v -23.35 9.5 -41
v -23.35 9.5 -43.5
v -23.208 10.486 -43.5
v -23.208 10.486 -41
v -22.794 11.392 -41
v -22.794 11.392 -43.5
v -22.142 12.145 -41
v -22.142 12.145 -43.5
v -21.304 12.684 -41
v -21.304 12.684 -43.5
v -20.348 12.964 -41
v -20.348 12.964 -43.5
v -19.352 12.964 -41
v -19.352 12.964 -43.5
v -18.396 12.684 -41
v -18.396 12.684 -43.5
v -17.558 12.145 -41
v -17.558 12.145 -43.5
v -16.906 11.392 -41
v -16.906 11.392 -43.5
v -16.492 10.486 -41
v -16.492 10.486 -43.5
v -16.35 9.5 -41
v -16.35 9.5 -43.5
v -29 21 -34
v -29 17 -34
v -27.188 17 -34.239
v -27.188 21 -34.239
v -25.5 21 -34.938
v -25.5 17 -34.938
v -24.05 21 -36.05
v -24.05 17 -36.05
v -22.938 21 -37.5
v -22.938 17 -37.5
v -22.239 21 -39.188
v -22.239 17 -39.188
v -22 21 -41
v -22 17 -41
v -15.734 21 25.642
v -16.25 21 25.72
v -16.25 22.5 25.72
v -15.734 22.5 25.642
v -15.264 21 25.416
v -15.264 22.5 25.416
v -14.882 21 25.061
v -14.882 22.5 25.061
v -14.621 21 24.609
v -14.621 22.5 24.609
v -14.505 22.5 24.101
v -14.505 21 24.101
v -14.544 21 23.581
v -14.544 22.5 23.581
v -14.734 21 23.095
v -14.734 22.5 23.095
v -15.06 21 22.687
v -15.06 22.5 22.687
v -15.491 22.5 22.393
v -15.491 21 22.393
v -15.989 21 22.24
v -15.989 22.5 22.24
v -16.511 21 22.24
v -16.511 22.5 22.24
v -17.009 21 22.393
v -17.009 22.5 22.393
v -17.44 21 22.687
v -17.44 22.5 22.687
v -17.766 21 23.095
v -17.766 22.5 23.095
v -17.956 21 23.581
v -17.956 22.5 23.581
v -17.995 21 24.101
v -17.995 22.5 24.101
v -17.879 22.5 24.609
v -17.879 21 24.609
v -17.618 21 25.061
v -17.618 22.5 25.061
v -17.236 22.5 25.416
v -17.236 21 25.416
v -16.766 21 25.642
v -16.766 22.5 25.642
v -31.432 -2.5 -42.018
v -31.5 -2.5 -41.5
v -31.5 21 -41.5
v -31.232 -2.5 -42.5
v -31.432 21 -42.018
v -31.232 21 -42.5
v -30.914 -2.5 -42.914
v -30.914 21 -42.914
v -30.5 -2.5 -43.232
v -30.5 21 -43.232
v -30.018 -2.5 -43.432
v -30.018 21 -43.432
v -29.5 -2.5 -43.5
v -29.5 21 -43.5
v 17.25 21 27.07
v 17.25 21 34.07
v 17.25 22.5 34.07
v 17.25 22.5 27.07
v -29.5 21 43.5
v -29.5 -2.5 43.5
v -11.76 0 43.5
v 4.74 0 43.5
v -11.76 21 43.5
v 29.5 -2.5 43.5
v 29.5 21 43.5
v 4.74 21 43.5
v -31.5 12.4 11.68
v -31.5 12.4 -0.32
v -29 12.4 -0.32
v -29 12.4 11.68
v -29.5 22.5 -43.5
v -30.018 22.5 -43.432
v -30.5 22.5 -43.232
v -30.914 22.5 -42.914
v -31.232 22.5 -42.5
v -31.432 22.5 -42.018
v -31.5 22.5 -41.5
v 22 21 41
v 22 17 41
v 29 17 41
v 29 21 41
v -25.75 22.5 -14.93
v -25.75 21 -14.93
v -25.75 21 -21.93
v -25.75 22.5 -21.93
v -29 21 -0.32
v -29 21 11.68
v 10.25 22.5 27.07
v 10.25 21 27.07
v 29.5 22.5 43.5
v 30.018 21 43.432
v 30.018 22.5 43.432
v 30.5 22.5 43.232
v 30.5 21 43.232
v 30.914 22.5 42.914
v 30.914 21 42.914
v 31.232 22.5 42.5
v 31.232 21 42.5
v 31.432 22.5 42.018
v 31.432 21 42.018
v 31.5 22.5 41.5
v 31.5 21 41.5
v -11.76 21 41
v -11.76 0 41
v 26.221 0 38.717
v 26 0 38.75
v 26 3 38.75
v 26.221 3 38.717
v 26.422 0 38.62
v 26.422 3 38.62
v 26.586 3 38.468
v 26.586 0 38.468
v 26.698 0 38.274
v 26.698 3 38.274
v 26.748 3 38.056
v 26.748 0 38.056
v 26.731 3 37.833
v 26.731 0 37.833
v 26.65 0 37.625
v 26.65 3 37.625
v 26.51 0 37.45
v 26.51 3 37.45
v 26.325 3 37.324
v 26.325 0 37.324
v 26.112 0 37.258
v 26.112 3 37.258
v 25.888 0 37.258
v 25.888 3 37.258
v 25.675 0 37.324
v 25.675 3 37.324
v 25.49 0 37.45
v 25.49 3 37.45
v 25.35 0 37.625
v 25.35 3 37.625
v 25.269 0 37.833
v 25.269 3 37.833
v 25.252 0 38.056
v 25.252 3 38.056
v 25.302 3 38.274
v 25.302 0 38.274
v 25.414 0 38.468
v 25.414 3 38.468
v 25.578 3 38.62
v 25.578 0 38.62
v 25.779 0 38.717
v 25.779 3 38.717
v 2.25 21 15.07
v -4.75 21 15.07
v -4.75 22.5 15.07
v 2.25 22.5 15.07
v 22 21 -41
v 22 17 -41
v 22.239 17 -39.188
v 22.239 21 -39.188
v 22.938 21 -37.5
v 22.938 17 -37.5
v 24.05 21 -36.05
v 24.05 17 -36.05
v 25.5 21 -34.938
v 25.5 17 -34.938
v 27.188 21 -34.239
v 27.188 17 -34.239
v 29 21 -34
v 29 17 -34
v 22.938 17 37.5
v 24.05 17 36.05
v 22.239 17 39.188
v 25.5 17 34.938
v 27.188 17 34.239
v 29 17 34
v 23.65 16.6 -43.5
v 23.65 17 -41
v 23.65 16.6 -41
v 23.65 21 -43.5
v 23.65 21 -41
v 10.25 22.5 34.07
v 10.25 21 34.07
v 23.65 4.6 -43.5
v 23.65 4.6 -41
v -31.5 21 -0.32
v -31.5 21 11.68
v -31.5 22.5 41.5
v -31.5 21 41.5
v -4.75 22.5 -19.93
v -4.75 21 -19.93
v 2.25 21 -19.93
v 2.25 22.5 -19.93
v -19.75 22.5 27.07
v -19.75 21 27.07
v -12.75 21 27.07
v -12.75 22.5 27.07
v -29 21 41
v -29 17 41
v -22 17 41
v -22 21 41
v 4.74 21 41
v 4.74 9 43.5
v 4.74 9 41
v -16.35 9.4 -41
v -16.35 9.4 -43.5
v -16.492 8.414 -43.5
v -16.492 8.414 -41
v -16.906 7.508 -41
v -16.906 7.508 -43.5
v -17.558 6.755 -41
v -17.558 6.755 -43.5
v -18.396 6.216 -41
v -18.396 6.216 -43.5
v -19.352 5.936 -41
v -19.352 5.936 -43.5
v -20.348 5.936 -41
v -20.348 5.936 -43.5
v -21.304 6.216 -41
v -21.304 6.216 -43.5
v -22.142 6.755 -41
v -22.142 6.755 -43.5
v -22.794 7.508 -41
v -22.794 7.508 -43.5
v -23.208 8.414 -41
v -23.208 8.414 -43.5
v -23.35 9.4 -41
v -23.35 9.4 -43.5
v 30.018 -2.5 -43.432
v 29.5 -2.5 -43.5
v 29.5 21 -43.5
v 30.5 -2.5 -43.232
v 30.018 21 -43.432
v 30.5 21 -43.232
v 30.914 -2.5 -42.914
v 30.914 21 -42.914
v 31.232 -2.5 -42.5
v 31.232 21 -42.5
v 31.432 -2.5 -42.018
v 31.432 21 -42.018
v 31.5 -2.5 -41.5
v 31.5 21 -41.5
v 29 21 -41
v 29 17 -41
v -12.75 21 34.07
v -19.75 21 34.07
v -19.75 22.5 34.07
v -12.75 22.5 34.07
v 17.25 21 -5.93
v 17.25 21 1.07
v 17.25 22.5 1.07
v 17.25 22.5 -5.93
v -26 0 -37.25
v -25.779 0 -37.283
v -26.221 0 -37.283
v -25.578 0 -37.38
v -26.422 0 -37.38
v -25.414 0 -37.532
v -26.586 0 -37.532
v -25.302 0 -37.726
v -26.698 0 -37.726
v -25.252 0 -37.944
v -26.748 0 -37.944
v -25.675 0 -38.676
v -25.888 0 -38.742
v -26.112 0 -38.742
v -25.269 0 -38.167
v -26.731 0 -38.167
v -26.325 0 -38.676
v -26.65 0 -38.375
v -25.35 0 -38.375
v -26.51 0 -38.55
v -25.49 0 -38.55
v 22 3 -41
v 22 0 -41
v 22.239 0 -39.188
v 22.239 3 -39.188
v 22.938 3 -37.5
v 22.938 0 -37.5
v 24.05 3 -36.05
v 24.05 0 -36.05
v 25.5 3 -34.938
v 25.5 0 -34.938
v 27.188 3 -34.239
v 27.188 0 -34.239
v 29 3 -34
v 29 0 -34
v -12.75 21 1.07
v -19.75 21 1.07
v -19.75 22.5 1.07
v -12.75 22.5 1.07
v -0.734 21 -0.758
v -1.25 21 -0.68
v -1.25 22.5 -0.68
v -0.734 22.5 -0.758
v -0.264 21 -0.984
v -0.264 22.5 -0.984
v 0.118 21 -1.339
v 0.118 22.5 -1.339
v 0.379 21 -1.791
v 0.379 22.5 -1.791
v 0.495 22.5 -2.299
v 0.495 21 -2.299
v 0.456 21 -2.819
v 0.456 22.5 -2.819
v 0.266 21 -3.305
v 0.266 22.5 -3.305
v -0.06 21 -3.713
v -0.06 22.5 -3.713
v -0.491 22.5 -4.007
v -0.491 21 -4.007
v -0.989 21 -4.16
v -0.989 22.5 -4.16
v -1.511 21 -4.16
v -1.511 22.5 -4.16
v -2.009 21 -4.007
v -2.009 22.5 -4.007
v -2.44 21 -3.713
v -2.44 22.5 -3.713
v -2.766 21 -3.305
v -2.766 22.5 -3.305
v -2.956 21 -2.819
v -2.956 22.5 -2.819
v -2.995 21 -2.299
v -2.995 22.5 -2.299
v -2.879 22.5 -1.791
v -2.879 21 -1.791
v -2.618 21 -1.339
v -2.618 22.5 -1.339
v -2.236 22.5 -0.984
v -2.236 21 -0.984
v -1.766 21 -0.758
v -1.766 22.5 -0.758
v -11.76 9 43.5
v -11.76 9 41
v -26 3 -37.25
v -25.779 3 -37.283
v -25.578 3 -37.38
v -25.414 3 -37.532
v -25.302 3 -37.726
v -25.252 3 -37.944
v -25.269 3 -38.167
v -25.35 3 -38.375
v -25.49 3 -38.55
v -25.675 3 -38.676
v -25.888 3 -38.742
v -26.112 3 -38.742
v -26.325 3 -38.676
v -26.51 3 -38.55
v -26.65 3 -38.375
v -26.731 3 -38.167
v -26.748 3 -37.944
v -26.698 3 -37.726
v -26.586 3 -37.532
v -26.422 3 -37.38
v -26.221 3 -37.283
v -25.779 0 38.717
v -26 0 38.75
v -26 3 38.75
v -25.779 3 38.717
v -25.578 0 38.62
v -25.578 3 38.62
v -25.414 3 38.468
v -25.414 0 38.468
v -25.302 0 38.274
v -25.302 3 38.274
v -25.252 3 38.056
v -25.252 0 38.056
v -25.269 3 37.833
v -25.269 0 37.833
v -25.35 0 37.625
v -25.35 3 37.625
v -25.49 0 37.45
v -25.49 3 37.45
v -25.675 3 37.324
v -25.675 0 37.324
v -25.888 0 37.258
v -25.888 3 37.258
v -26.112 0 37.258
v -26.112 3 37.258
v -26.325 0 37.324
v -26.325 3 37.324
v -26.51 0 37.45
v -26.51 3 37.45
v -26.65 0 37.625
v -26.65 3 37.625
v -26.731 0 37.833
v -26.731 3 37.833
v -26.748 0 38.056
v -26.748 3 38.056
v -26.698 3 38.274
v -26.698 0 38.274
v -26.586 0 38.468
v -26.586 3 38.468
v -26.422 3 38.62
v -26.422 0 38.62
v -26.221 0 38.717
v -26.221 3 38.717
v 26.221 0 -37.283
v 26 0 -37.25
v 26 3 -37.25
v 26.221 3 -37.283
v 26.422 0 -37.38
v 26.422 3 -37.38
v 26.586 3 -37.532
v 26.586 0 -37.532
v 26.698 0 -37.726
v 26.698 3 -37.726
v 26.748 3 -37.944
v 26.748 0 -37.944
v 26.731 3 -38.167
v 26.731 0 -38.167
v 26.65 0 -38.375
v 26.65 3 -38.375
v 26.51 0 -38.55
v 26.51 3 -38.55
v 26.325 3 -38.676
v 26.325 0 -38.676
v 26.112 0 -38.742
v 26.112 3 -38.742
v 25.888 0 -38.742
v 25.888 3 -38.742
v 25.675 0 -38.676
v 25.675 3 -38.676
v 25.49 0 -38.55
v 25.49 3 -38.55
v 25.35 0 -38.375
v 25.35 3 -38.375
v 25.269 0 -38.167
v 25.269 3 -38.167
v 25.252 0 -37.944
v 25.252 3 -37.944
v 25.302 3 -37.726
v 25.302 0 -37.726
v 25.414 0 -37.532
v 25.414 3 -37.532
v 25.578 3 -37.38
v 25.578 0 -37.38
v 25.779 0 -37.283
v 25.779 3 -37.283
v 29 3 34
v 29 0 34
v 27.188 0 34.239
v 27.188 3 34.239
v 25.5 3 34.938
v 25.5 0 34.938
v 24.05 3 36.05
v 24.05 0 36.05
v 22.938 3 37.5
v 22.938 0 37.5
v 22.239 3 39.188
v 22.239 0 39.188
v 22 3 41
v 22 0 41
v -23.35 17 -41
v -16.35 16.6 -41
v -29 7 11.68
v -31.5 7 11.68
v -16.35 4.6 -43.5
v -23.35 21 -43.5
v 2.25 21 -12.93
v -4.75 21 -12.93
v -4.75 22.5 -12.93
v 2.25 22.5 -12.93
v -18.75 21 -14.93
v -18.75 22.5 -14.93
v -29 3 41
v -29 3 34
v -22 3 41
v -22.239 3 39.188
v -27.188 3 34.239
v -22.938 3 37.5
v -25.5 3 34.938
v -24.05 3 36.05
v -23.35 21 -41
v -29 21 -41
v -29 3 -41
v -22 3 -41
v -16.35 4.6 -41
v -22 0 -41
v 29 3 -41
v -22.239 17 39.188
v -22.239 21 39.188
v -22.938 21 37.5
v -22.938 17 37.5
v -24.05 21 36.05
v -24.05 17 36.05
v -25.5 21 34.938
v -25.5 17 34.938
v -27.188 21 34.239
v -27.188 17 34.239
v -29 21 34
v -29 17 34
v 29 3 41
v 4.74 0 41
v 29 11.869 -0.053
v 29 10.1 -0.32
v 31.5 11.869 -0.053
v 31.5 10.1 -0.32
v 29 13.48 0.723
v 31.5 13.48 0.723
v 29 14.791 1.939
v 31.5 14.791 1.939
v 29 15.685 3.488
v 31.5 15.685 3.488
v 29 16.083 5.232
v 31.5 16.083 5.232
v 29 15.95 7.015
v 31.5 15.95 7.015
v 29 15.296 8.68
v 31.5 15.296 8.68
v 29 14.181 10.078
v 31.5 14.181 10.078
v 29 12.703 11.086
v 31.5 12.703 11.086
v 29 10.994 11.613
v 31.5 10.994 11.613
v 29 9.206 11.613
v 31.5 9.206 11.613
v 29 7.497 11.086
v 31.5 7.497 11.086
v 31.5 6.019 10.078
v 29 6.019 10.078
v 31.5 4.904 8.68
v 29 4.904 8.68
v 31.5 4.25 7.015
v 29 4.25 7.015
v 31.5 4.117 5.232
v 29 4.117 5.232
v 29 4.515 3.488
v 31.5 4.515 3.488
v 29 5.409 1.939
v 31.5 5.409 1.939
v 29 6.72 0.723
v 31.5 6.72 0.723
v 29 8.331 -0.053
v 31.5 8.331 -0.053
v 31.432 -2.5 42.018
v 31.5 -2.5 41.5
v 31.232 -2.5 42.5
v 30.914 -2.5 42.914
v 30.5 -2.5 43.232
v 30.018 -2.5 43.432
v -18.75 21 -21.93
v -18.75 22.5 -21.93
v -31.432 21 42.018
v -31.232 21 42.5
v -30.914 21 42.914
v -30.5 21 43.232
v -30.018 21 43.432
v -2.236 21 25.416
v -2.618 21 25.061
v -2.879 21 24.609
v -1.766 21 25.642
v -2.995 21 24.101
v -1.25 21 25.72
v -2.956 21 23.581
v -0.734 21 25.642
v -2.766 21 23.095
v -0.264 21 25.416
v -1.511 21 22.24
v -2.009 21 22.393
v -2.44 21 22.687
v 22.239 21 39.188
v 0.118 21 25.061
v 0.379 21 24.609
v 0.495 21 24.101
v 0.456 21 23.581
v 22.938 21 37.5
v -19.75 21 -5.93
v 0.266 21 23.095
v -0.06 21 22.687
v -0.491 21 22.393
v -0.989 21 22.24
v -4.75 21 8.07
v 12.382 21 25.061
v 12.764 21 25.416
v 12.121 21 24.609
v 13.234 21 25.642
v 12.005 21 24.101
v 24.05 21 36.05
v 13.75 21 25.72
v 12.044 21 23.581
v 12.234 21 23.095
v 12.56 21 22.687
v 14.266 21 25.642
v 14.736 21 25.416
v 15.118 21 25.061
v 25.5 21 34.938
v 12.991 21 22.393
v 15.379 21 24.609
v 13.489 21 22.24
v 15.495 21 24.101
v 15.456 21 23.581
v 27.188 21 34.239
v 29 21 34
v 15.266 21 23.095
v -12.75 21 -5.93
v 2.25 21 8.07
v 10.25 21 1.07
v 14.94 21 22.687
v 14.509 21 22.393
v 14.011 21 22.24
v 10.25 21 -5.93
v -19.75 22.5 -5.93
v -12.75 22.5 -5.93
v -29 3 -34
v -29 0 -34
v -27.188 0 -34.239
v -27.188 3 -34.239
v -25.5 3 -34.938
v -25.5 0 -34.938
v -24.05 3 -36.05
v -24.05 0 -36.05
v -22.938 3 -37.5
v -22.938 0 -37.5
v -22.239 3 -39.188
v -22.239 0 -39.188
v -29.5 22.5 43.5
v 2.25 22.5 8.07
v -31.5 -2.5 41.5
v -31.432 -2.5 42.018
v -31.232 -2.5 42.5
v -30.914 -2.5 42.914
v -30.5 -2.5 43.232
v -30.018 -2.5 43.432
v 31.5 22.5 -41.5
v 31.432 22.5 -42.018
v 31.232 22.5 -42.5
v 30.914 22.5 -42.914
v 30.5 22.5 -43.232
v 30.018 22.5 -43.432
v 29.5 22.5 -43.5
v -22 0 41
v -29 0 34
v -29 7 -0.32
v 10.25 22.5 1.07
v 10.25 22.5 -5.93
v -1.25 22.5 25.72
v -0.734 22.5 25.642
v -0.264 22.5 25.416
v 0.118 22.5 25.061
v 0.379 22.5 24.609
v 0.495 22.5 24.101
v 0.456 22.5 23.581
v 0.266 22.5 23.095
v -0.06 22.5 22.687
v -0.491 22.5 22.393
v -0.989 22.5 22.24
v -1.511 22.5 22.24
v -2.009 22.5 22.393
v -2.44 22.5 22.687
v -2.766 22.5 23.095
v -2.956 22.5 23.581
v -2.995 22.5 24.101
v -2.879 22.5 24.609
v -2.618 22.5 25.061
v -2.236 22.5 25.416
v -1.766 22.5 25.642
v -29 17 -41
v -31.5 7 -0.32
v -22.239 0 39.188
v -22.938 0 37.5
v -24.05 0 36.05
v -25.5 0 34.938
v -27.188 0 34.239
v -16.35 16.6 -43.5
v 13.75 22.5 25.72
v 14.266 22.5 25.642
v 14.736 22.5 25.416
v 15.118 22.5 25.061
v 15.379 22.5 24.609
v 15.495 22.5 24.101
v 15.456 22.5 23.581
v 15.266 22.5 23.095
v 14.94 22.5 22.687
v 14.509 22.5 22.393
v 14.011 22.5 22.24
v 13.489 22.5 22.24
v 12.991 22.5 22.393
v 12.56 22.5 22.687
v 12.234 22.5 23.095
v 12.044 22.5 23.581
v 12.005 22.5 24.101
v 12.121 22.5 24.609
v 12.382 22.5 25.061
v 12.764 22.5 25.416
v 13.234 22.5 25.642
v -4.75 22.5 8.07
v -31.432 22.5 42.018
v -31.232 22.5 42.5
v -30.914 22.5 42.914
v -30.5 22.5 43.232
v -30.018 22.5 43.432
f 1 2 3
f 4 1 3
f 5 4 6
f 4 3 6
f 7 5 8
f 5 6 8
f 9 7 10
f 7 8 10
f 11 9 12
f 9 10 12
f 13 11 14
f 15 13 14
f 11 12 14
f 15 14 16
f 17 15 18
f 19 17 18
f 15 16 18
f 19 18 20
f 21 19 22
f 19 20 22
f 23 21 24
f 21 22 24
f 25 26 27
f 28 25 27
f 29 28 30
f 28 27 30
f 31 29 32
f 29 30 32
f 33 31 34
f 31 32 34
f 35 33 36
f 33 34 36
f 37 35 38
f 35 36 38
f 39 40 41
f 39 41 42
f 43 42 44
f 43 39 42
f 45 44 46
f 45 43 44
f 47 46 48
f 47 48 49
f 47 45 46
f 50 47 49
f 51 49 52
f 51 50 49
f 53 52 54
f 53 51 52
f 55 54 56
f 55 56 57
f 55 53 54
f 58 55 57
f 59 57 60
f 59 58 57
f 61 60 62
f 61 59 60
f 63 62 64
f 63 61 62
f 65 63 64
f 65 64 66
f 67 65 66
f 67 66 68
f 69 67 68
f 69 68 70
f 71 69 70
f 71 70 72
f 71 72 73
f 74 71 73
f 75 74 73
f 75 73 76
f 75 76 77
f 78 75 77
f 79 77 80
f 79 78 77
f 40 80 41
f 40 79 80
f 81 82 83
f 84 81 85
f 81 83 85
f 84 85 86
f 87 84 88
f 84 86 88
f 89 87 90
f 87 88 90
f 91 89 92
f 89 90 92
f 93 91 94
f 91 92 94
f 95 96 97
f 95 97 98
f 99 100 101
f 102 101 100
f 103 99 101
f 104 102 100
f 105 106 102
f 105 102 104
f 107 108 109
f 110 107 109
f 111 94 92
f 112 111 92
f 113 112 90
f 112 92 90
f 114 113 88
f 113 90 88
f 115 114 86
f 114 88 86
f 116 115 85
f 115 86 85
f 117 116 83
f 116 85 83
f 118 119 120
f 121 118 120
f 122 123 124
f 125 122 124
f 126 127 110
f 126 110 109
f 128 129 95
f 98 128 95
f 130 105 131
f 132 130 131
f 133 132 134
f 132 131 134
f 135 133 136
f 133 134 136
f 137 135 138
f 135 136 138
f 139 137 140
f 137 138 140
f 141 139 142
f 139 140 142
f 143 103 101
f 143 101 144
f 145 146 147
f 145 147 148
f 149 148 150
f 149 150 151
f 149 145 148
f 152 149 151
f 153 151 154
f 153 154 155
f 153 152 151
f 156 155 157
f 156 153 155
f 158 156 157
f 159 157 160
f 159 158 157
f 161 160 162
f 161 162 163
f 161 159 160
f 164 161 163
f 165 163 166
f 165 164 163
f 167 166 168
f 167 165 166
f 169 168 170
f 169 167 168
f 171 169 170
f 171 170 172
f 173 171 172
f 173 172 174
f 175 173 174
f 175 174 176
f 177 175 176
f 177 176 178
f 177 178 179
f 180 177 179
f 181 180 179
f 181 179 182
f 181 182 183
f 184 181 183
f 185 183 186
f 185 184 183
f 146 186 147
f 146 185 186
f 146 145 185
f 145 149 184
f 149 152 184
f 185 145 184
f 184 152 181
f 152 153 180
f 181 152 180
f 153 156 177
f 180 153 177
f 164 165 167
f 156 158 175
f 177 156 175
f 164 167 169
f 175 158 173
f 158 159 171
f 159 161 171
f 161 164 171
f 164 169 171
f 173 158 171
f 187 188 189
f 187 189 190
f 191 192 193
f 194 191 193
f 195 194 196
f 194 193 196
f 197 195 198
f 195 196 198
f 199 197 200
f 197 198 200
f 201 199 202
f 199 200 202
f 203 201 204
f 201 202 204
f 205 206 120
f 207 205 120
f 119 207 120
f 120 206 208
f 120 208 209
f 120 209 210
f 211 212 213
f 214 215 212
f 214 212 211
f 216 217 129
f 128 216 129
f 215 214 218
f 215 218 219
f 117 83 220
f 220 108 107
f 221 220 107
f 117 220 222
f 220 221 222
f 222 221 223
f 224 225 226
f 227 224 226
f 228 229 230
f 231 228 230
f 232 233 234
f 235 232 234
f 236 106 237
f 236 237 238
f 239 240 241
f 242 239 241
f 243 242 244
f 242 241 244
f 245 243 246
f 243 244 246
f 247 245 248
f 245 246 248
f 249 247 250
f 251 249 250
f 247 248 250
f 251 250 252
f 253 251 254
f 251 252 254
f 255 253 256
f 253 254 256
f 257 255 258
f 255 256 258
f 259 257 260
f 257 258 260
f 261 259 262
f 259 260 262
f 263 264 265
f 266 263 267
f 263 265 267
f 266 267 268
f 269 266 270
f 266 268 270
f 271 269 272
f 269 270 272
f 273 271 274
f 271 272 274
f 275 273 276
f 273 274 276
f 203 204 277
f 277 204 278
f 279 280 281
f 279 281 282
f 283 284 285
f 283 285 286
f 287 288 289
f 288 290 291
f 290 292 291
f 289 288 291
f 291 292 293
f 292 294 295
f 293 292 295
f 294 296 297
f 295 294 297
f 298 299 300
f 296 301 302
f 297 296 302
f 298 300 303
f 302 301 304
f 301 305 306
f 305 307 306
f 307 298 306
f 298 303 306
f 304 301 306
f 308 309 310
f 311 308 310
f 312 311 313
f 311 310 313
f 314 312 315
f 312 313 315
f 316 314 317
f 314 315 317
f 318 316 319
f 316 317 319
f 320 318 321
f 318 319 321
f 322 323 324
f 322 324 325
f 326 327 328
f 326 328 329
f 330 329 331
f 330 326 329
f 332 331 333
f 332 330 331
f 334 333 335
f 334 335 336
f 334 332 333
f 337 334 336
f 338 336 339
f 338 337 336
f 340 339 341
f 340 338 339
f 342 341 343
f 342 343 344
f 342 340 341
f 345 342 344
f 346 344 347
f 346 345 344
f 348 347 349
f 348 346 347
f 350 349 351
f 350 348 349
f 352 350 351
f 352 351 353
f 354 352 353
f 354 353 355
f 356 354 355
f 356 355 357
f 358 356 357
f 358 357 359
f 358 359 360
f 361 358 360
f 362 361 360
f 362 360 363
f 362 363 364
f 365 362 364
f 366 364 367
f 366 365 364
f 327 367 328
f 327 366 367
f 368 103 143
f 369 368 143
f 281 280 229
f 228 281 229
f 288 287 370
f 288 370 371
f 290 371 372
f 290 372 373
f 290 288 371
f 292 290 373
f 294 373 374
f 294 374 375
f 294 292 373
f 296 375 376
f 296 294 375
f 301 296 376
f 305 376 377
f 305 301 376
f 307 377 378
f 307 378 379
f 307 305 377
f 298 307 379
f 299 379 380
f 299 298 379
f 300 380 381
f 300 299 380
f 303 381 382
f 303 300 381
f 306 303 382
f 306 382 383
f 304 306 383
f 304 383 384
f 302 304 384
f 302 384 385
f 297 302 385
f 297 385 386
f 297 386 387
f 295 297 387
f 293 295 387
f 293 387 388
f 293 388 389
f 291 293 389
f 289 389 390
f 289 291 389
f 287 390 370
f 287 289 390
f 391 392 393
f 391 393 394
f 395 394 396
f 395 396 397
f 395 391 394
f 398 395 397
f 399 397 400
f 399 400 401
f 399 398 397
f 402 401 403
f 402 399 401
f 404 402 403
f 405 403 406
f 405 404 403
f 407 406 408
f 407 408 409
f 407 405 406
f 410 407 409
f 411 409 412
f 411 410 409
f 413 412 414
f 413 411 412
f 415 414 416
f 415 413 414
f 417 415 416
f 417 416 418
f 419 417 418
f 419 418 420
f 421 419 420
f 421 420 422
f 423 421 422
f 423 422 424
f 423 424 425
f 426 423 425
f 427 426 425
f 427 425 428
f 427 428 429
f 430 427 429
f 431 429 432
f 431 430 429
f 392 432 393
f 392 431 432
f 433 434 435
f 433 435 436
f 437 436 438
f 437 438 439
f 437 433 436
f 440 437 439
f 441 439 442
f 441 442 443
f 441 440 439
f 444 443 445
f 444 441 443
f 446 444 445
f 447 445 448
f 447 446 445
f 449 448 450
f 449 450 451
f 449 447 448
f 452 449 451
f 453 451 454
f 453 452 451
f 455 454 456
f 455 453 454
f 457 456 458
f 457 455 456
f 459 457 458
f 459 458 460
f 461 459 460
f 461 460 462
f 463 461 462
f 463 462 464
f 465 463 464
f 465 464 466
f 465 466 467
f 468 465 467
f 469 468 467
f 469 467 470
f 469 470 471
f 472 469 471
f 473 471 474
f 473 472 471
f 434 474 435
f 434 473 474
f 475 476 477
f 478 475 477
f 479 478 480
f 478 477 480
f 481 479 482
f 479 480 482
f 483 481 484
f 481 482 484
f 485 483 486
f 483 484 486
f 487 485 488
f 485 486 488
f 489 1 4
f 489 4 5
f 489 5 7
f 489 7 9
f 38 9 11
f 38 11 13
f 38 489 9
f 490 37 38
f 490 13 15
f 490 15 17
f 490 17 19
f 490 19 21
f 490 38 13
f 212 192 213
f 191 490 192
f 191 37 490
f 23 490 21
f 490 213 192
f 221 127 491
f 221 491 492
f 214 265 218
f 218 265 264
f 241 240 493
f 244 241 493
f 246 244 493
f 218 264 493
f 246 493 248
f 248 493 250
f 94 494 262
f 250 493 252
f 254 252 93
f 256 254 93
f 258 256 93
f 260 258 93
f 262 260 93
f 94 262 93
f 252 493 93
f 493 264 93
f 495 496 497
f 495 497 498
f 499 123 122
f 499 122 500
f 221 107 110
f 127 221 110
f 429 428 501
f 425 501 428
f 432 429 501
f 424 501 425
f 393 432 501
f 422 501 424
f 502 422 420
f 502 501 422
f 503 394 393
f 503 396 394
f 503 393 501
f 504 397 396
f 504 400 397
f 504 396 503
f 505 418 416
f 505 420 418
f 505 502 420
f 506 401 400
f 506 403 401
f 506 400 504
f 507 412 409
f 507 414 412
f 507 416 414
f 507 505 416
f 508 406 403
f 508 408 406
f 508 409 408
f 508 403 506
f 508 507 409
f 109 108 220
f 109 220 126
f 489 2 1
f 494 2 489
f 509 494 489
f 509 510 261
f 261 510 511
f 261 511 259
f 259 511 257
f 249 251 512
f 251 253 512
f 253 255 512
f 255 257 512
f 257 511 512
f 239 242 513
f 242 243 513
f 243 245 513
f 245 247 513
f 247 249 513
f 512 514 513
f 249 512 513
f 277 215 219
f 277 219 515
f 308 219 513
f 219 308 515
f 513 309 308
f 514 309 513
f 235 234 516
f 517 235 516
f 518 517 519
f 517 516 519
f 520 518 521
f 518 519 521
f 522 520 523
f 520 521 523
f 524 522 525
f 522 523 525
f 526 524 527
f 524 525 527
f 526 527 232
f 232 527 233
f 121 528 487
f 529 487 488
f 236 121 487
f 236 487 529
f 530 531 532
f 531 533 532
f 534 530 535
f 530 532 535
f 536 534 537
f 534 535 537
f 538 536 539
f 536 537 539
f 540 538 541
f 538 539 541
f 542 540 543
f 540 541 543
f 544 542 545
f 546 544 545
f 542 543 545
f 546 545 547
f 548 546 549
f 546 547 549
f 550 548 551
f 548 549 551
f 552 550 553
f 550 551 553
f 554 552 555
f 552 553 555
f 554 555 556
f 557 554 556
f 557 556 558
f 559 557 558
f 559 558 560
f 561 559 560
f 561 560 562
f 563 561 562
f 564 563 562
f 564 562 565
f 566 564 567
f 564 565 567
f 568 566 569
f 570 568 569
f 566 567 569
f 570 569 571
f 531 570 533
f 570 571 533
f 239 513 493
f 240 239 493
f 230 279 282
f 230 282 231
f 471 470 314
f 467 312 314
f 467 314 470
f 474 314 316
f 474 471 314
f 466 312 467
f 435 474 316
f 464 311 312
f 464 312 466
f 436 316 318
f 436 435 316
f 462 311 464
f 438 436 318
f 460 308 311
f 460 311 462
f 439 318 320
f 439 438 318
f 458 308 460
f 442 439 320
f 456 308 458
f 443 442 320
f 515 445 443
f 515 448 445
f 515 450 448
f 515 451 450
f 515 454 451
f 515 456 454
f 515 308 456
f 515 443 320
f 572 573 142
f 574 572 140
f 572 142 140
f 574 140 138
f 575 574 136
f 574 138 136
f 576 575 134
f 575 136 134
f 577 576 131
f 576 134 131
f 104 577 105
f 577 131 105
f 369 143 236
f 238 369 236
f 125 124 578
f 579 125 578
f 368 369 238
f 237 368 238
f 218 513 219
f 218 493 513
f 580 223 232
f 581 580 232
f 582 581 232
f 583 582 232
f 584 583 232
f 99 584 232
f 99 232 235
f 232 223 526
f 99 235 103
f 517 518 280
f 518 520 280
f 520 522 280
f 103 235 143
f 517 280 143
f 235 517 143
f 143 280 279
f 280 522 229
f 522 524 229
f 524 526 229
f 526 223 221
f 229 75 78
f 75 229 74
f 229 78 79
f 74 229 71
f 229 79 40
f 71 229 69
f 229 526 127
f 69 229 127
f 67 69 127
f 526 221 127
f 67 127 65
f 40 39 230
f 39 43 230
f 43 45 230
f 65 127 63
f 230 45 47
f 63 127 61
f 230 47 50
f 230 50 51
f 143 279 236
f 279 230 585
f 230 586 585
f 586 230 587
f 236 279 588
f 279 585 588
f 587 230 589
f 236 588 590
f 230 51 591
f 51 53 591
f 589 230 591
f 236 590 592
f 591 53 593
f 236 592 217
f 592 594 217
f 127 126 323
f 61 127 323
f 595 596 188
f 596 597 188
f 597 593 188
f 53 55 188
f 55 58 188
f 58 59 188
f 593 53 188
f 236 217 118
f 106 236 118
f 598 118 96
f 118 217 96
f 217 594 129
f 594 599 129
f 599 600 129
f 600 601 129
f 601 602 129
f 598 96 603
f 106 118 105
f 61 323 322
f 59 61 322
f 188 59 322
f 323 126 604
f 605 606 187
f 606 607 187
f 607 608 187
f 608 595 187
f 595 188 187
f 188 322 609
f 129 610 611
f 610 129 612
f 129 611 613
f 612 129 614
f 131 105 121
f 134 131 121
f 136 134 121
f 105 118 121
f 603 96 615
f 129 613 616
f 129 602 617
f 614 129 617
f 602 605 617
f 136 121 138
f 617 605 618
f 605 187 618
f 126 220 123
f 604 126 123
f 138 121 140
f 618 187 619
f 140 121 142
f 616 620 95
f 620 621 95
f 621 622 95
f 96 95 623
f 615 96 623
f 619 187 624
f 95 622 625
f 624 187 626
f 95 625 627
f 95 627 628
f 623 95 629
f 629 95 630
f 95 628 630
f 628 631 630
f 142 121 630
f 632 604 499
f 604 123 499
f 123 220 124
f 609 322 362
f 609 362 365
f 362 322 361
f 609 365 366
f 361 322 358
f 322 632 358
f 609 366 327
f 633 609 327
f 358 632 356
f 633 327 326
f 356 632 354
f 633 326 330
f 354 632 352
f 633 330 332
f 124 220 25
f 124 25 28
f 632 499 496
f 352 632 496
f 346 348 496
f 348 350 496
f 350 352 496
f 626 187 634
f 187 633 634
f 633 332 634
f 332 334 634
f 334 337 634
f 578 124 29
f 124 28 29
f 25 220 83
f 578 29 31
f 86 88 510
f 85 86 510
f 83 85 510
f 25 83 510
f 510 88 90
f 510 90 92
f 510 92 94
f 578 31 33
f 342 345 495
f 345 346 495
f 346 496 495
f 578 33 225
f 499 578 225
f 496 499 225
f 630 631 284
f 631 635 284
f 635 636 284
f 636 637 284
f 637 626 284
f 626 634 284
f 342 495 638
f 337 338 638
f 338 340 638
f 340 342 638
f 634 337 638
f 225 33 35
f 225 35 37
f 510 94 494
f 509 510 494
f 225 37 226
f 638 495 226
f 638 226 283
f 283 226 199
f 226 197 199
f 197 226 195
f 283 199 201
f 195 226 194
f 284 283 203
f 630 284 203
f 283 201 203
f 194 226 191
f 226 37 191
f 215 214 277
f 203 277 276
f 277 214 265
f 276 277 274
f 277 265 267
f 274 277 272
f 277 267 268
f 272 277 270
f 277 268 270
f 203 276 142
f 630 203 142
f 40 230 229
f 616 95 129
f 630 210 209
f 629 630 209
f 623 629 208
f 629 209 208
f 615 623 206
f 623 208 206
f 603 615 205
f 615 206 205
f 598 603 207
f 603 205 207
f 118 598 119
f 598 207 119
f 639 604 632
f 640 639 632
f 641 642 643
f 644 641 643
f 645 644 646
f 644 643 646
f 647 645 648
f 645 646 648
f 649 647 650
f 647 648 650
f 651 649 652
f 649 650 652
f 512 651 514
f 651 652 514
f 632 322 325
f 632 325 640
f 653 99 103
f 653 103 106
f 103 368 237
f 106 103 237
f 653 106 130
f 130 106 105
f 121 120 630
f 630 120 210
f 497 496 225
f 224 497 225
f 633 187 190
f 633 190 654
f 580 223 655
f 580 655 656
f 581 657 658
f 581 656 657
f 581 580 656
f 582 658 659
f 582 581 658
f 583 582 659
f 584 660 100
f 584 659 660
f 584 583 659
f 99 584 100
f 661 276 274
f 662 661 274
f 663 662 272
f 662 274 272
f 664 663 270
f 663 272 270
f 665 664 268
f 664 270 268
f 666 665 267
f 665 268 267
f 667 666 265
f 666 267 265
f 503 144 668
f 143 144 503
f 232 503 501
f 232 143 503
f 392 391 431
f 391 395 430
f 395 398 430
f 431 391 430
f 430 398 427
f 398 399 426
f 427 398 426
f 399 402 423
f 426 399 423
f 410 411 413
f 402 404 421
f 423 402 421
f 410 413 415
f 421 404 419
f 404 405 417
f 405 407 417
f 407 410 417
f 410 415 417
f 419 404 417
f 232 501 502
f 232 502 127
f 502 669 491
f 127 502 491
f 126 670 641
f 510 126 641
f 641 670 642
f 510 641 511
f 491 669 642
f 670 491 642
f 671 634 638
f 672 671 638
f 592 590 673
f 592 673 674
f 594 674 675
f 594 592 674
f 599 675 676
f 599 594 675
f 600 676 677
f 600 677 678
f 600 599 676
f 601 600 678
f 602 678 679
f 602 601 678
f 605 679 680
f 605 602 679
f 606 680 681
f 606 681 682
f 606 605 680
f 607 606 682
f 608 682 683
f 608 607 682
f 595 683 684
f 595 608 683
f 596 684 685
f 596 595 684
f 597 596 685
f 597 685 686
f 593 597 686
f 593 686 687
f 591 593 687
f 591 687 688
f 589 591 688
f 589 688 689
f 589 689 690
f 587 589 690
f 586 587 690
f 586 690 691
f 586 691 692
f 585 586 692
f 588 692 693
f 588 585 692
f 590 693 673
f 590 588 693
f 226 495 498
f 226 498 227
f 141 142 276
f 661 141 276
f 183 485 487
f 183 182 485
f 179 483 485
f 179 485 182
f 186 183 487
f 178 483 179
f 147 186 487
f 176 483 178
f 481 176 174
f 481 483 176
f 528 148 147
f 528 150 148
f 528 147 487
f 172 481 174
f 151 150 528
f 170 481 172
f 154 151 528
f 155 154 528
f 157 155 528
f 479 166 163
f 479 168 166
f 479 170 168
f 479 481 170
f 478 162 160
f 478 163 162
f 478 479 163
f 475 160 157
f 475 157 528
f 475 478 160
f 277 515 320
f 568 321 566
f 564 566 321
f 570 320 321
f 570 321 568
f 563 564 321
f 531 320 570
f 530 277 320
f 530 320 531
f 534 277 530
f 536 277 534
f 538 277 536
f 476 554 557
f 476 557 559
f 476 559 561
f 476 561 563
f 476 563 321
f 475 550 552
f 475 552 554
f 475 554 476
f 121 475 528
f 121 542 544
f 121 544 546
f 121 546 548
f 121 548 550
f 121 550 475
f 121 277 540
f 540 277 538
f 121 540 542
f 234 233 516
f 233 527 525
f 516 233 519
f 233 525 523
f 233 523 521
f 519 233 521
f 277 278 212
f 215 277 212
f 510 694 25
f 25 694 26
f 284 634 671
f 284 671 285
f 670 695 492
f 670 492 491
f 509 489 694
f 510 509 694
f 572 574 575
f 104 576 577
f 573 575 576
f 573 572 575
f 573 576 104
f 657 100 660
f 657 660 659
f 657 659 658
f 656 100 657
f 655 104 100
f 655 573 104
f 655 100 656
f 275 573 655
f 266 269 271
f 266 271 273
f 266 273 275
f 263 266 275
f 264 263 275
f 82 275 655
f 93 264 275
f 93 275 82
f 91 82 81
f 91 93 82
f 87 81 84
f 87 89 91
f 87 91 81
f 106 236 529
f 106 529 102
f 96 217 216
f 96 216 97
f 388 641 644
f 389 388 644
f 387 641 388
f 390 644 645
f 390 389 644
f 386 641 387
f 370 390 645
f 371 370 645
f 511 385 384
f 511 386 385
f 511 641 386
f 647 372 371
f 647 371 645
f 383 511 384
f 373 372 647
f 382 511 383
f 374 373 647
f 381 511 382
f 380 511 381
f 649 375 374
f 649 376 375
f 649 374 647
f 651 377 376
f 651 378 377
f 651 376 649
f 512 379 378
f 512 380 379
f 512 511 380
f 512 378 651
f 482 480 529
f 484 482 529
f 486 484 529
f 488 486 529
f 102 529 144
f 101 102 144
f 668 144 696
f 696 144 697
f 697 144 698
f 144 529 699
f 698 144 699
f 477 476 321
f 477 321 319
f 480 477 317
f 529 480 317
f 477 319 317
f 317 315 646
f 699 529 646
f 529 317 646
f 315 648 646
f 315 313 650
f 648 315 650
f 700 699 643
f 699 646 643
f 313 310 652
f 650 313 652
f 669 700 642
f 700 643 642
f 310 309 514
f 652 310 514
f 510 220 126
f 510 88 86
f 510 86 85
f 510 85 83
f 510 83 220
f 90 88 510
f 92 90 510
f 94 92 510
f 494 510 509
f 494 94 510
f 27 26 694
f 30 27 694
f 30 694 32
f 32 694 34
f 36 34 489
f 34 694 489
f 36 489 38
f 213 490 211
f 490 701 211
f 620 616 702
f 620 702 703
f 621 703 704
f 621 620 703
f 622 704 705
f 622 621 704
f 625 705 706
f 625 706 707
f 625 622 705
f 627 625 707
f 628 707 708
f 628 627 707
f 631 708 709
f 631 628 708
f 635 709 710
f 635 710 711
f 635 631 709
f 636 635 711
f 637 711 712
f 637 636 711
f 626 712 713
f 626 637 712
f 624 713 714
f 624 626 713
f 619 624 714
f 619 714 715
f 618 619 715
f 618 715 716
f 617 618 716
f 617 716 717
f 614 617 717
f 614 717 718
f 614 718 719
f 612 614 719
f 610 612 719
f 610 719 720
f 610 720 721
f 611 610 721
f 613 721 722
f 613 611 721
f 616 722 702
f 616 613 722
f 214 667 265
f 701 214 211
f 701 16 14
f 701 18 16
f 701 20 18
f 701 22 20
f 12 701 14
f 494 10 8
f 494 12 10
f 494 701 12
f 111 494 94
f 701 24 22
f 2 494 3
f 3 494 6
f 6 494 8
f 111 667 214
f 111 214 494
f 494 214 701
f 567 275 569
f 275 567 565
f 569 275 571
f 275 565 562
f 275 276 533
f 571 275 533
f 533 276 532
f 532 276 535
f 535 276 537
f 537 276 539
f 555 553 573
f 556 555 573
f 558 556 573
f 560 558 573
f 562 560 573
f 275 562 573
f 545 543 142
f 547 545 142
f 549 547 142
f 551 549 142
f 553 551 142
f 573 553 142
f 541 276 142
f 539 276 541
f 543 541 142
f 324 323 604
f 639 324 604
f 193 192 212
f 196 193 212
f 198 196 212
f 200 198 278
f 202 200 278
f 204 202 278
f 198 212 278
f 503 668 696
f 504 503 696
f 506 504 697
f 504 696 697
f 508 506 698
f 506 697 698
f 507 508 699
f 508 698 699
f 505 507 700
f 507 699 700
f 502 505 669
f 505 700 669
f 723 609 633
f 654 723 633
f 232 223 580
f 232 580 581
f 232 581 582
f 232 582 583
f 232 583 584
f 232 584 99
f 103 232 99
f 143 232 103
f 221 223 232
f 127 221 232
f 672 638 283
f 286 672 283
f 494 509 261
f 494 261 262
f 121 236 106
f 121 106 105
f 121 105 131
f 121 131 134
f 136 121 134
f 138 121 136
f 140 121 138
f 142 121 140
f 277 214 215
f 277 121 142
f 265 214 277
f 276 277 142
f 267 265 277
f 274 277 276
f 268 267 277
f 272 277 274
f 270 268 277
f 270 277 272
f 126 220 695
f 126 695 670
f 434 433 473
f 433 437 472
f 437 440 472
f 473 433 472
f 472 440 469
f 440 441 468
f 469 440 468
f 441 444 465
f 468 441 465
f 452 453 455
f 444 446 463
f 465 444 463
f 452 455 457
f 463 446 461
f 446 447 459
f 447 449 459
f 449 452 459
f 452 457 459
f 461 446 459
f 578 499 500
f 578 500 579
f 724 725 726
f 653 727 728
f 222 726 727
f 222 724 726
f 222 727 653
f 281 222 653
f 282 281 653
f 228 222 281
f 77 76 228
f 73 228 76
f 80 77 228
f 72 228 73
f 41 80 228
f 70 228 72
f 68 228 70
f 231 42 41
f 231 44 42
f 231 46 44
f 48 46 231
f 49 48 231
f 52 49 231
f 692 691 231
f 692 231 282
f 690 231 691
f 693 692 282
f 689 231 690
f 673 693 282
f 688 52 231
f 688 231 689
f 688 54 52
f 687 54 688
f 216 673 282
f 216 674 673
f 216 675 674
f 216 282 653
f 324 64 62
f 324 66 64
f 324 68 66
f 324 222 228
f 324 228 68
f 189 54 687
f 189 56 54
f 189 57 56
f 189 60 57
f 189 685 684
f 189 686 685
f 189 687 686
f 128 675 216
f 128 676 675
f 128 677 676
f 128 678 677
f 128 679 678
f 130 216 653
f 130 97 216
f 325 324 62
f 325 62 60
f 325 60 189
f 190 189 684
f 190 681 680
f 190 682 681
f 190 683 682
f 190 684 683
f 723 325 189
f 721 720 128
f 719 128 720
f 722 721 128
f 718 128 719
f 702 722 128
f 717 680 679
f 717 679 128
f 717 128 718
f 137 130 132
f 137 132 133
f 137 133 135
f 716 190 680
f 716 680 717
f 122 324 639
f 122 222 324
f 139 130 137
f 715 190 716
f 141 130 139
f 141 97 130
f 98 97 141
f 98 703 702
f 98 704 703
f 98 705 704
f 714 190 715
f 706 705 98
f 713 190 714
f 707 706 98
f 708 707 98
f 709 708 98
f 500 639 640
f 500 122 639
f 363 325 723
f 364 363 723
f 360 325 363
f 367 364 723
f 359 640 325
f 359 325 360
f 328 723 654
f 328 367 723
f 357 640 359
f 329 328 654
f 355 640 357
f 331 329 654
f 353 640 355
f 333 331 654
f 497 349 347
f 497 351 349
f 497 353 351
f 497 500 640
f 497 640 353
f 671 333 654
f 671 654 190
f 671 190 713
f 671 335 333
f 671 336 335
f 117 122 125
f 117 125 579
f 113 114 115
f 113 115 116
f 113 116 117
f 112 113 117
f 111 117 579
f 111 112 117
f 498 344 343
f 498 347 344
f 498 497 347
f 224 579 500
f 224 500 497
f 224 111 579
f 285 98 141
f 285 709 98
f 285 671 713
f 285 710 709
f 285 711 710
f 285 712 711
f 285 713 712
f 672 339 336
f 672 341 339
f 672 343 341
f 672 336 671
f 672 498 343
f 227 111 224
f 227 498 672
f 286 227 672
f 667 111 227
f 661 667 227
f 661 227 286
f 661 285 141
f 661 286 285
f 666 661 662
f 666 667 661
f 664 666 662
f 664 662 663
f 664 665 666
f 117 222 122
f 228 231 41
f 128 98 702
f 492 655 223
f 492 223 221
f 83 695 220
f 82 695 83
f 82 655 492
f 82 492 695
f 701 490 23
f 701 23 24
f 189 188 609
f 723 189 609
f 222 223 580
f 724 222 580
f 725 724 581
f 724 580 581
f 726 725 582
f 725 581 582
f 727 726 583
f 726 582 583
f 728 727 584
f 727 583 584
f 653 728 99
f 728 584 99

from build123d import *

# Parameters (mm, degrees)
EXTRUDE_1_DEPTH     = 2.5
SKETCH_1_4_R        = 0.75
EXTRUDE_2_DEPTH     = 3
EXTRUDE_4_DEPTH     = 4.6
EXTRUDE_START       = 21
EXTRUDE_5_DEPTH     = 21
EXTRUDE_6_DEPTH     = 9.4
CUT_EXTRUDE_1_REACH = 96.88
SKETCH_2_R          = 3.5
CUT_EXTRUDE_2_REACH = 81.387
SKETCH_3_R          = 6
SKETCH_1_8_W        = 2.5
SKETCH_1_8_H        = 12
EXTRUDE_11_DEPTH    = 7
SKETCH_4_W          = 7
SKETCH_4_H          = 7
SKETCH_4_R          = 1.75
EXTRUDE_7_DEPTH     = 1.5
SKETCH_4_4_W        = 16.5
SKETCH_4_4_H        = 2.5
EXTRUDE_8_DEPTH     = 12
EXTRUDE_9_DEPTH     = 11.5
SKETCH_5_R          = 3.5
CUT_EXTRUDE_3_DEPTH = 2.5
EXTRUDE_10_DEPTH    = 4.4
SKETCH_4_7_W        = 2.5
SKETCH_4_7_H        = 12
EXTRUDE_12_DEPTH    = 8.6
EXTRUDE_START_2     = -4
SKETCH_4_8_R        = 0.75
EXTRUDE_13_DEPTH    = 4


with BuildPart() as part:
    # 草图1 → 凸台-拉伸1 (new body)
    with BuildSketch(Plane(origin=(0, 0, 0), x_dir=(1, 0, 0), z_dir=(0, 1, 0))):
        with BuildLine():
            Line((-29.5, 43.5), (29.5, 43.5))
            ThreePointArc((29.5, 43.5), (30.914213562, 42.914213562), (31.5, 41.5))
            Line((31.5, 41.5), (31.5, -41.5))
            ThreePointArc((31.5, -41.5), (30.914213562, -42.914213562), (29.5, -43.5))
            Line((29.5, -43.5), (-29.5, -43.5))
            ThreePointArc((-29.5, -43.5), (-30.914213562, -42.914213562), (-31.5, -41.5))
            Line((-31.5, -41.5), (-31.5, 41.5))
            ThreePointArc((-31.5, 41.5), (-30.914213562, 42.914213562), (-29.5, 43.5))
        make_face()
    extrude(amount=-EXTRUDE_1_DEPTH)

    # 草图1<4> → 凸台-拉伸2 (add)
    # profile 1 of 4: a face of its own
    with BuildSketch(Plane(origin=(0, 0, 0), x_dir=(1, 0, 0), z_dir=(0, 1, 0))):
        with BuildLine():
            Line((-29, 41), (-29, 34))
            ThreePointArc((-29, 34), (-24.050252532, 36.050252532), (-22, 41))
            Line((-22, 41), (-23.35, 41))
            Line((-23.35, 41), (-29, 41))
        make_face()
        with Locations(Location((-26, 38, 0), (0, 0, 270))):
            Circle(SKETCH_1_4_R, mode=Mode.SUBTRACT)
    # profile 2 of 4: a face of its own
    with BuildSketch(Plane(origin=(0, 0, 0), x_dir=(1, 0, 0), z_dir=(0, 1, 0))):
        with BuildLine():
            ThreePointArc((22, 41), (24.050252532, 36.050252532), (29, 34))
            Line((29, 34), (29, 41))
            Line((29, 41), (23.65, 41))
            Line((23.65, 41), (22, 41))
        make_face()
        with Locations(Location((26, 38, 0), (0, 0, 270))):
            Circle(SKETCH_1_4_R, mode=Mode.SUBTRACT)
    # profile 3 of 4: a face of its own
    with BuildSketch(Plane(origin=(0, 0, 0), x_dir=(1, 0, 0), z_dir=(0, 1, 0))):
        with BuildLine():
            ThreePointArc((29, -34), (24.050252532, -36.050252532), (22, -41))
            Line((22, -41), (29, -41))
            Line((29, -41), (29, -34))
        make_face()
        with Locations(Location((26, -38, 0), (0, 0, 270))):
            Circle(SKETCH_1_4_R, mode=Mode.SUBTRACT)
    # profile 4 of 4: a face of its own
    with BuildSketch(Plane(origin=(0, 0, 0), x_dir=(1, 0, 0), z_dir=(0, 1, 0))):
        with BuildLine():
            Line((-29, -41), (-22, -41))
            ThreePointArc((-22, -41), (-24.050252532, -36.050252532), (-29, -34))
            Line((-29, -34), (-29, -41))
        make_face()
        with Locations(Location((-26, -38, 0), (0, 0, 270))):
            Circle(SKETCH_1_4_R, mode=Mode.SUBTRACT)
    extrude(amount=EXTRUDE_2_DEPTH)



with BuildPart() as body_2:
    # 草图1<5> → 凸台-拉伸4 (new body)
    with BuildSketch(Plane(origin=(0, 0, 0), x_dir=(1, 0, 0), z_dir=(0, 1, 0))):
        Polygon((-16.35, 41), (22, 41), (23.65, 41), (23.65, 43.5), (-16.35, 43.5), align=None)
    extrude(amount=EXTRUDE_4_DEPTH)


with BuildPart() as part_1:
    add(part.part)

    add(body_2.part)  # 凸台-拉伸5 merges body 2
    # 草图1<6> → 凸台-拉伸5 (add)
    with BuildSketch(Plane(origin=(0, 0, 0), x_dir=(1, 0, 0), z_dir=(0, 1, 0)).offset(EXTRUDE_START)):
        with BuildLine():
            Line((-11.76, -43.5), (-11.76, -41))
            Line((-11.76, -41), (-29, -41))
            Line((-29, -41), (-29, -11.68))
            Line((-29, -11.68), (-31.5, -11.68))
            Line((-31.5, -11.68), (-31.5, -41.5))
            ThreePointArc((-31.5, -41.5), (-30.914213562, -42.914213562), (-29.5, -43.5))
            Line((-29.5, -43.5), (-11.76, -43.5))
        make_face()
        with BuildLine():
            Line((29, -41), (4.74, -41))
            Line((4.74, -41), (4.74, -43.5))
            Line((4.74, -43.5), (29.5, -43.5))
            ThreePointArc((29.5, -43.5), (30.914213562, -42.914213562), (31.5, -41.5))
            Line((31.5, -41.5), (31.5, 41.5))
            ThreePointArc((31.5, 41.5), (30.914213562, 42.914213562), (29.5, 43.5))
            Line((29.5, 43.5), (23.65, 43.5))
            Line((23.65, 43.5), (23.65, 41))
            Line((23.65, 41), (29, 41))
            Line((29, 41), (29, -41))
        make_face()
        with BuildLine():
            Line((-31.5, 0.32), (-29, 0.32))
            Line((-29, 0.32), (-29, 41))
            Line((-29, 41), (-23.35, 41))
            Line((-23.35, 41), (-23.35, 43.5))
            Line((-23.35, 43.5), (-29.5, 43.5))
            ThreePointArc((-29.5, 43.5), (-30.914213562, 42.914213562), (-31.5, 41.5))
            Line((-31.5, 41.5), (-31.5, 0.32))
        make_face()
    extrude(amount=-EXTRUDE_5_DEPTH)

    # 草图1<7> → 凸台-拉伸6 (add)
    with BuildSketch(Plane(origin=(0, 0, 0), x_dir=(1, 0, 0), z_dir=(0, 1, 0))):
        Polygon((-23.35, 41), (-22, 41), (-16.35, 41), (-16.35, 43.5), (-23.35, 43.5), align=None)
    extrude(amount=EXTRUDE_6_DEPTH)

    # 草图2 → 切除-拉伸1 (cut, up to next)
    with BuildSketch(Plane(origin=(0, 0, -43.5), x_dir=(-1, 0, 0), z_dir=(0, 0, -1)), mode=Mode.PRIVATE) as cut_extrude_1_sk1:
        with Locations((19.85, 9.4)):
            Circle(SKETCH_2_R)
    cut_extrude_1_tool1 = extrude(cut_extrude_1_sk1.sketch, amount=-CUT_EXTRUDE_1_REACH, mode=Mode.PRIVATE) & part_1.part
    add(cut_extrude_1_tool1.solids().sort_by_distance((-19.85, 9.4, -43.5))[0], mode=Mode.SUBTRACT)

    # 草图3 → 切除-拉伸2 (cut, up to next)
    with BuildSketch(Plane(origin=(31.5, 0, 0), x_dir=(0, 0, -1), z_dir=(1, 0, 0)), mode=Mode.PRIVATE) as cut_extrude_2_sk1:
        with Locations((-5.68, 10.1)):
            Circle(SKETCH_3_R)
    cut_extrude_2_tool1 = extrude(cut_extrude_2_sk1.sketch, amount=-CUT_EXTRUDE_2_REACH, mode=Mode.PRIVATE) & part_1.part
    add(cut_extrude_2_tool1.solids().sort_by_distance((31.5, 10.1, 5.68))[0], mode=Mode.SUBTRACT)

    # 草图1<8> → 凸台-拉伸11 (add)
    with BuildSketch(Plane(origin=(0, 0, 0), x_dir=(1, 0, 0), z_dir=(0, 1, 0))):
        with Locations((-30.25, -5.68)):
            Rectangle(SKETCH_1_8_W, SKETCH_1_8_H)
    extrude(amount=EXTRUDE_11_DEPTH)


with BuildPart() as body_2_2:
    # 草图4 → 凸台-拉伸7 (new body)
    with BuildSketch(Plane(origin=(0, 21, 0), x_dir=(1, 0, 0), z_dir=(0, 1, 0))):
        with BuildLine():
            ThreePointArc((-31.5, -41.5), (-30.914213562, -42.914213562), (-29.5, -43.5))
            Line((-29.5, -43.5), (29.5, -43.5))
            ThreePointArc((29.5, -43.5), (30.914213562, -42.914213562), (31.5, -41.5))
            Line((31.5, -41.5), (31.5, 41.5))
            ThreePointArc((31.5, 41.5), (30.914213562, 42.914213562), (29.5, 43.5))
            Line((29.5, 43.5), (-29.5, 43.5))
            ThreePointArc((-29.5, 43.5), (-30.914213562, 42.914213562), (-31.5, 41.5))
            Line((-31.5, 41.5), (-31.5, -41.5))
        make_face()
        with Locations((13.75, 2.43)):
            Rectangle(SKETCH_4_W, SKETCH_4_H, mode=Mode.SUBTRACT)
        with Locations((-16.25, -30.57)):
            Rectangle(SKETCH_4_W, SKETCH_4_H, mode=Mode.SUBTRACT)
        with Locations(Location((-16.25, -23.97, 0), (0, 0, 270))):
            Circle(SKETCH_4_R, mode=Mode.SUBTRACT)
        with Locations(Location((-1.25, -23.97, 0), (0, 0, 270))):
            Circle(SKETCH_4_R, mode=Mode.SUBTRACT)
        with Locations((-1.25, -11.57)):
            Rectangle(SKETCH_4_W, SKETCH_4_H, mode=Mode.SUBTRACT)
        with Locations((13.75, -30.57)):
            Rectangle(SKETCH_4_W, SKETCH_4_H, mode=Mode.SUBTRACT)
        with Locations(Location((13.75, -23.97, 0), (0, 0, 270))):
            Circle(SKETCH_4_R, mode=Mode.SUBTRACT)
        with Locations((-16.25, 2.43)):
            Rectangle(SKETCH_4_W, SKETCH_4_H, mode=Mode.SUBTRACT)
        with Locations((-22.25, 18.43)):
            Rectangle(SKETCH_4_W, SKETCH_4_H, mode=Mode.SUBTRACT)
        with Locations(Location((-1.25, 2.43, 0), (0, 0, 270))):
            Circle(SKETCH_4_R, mode=Mode.SUBTRACT)
        with Locations((-1.25, 16.43)):
            Rectangle(SKETCH_4_W, SKETCH_4_H, mode=Mode.SUBTRACT)
    extrude(amount=EXTRUDE_7_DEPTH)

    # 草图4<4> → 凸台-拉伸8 (add)
    with BuildSketch(Plane(origin=(0, 21, 0), x_dir=(1, 0, 0), z_dir=(0, 1, 0))):
        with Locations((-3.51, -42.25)):
            Rectangle(SKETCH_4_4_W, SKETCH_4_4_H)
    extrude(amount=-EXTRUDE_8_DEPTH)

    # 草图4<5> → 凸台-拉伸9 (add)
    with BuildSketch(Plane(origin=(0, 21, 0), x_dir=(1, 0, 0), z_dir=(0, 1, 0))):
        Polygon((-23.35, 41), (-22, 41), (-16.35, 41), (-16.35, 43.5), (-23.35, 43.5), align=None)
    extrude(amount=-EXTRUDE_9_DEPTH)

    # 草图5 → 切除-拉伸3 (cut)
    with BuildSketch(Plane(origin=(0, 0, -43.5), x_dir=(-1, 0, 0), z_dir=(0, 0, -1))):
        with Locations((19.85, 9.5)):
            Circle(SKETCH_5_R)
    extrude(amount=-CUT_EXTRUDE_3_DEPTH, mode=Mode.SUBTRACT)

    # 草图4<6> → 凸台-拉伸10 (add)
    with BuildSketch(Plane(origin=(0, 21, 0), x_dir=(1, 0, 0), z_dir=(0, 1, 0))):
        Polygon((-16.35, 41), (22, 41), (23.65, 41), (23.65, 43.5), (-16.35, 43.5), align=None)
    extrude(amount=-EXTRUDE_10_DEPTH)

    # 草图4<7> → 凸台-拉伸12 (add)
    with BuildSketch(Plane(origin=(0, 21, 0), x_dir=(1, 0, 0), z_dir=(0, 1, 0))):
        with Locations((-30.25, -5.68)):
            Rectangle(SKETCH_4_7_W, SKETCH_4_7_H)
    extrude(amount=-EXTRUDE_12_DEPTH)

    # 草图4<8> → 凸台-拉伸13 (add)
    # profile 1 of 8: a face of its own
    with BuildSketch(Plane(origin=(0, 21, 0), x_dir=(1, 0, 0), z_dir=(0, 1, 0)).offset(EXTRUDE_START_2)):
        with BuildLine():
            Line((-29, 41), (-29, 34))
            ThreePointArc((-29, 34), (-24.050252532, 36.050252532), (-22, 41))
            Line((-22, 41), (-23.35, 41))
            Line((-23.35, 41), (-29, 41))
        make_face()
        with Locations(Location((-26, 38, 0), (0, 0, 270))):
            Circle(SKETCH_4_8_R, mode=Mode.SUBTRACT)
    # profile 2 of 8: a face of its own
    with BuildSketch(Plane(origin=(0, 21, 0), x_dir=(1, 0, 0), z_dir=(0, 1, 0)).offset(EXTRUDE_START_2)):
        with BuildLine():
            ThreePointArc((22, 41), (24.050252532, 36.050252532), (29, 34))
            Line((29, 34), (29, 41))
            Line((29, 41), (23.65, 41))
            Line((23.65, 41), (22, 41))
        make_face()
        with Locations(Location((26, 38, 0), (0, 0, 270))):
            Circle(SKETCH_4_8_R, mode=Mode.SUBTRACT)
    # profile 3 of 8: a face of its own
    with BuildSketch(Plane(origin=(0, 21, 0), x_dir=(1, 0, 0), z_dir=(0, 1, 0)).offset(EXTRUDE_START_2)):
        with BuildLine():
            ThreePointArc((29, -34), (24.050252532, -36.050252532), (22, -41))
            Line((22, -41), (29, -41))
            Line((29, -41), (29, -34))
        make_face()
        with Locations(Location((26, -38, 0), (0, 0, 270))):
            Circle(SKETCH_4_8_R, mode=Mode.SUBTRACT)
    # profile 4 of 8: a face of its own
    with BuildSketch(Plane(origin=(0, 21, 0), x_dir=(1, 0, 0), z_dir=(0, 1, 0)).offset(EXTRUDE_START_2)):
        with BuildLine():
            Line((-29, -41), (-22, -41))
            ThreePointArc((-22, -41), (-24.050252532, -36.050252532), (-29, -34))
            Line((-29, -34), (-29, -41))
        make_face()
        with Locations(Location((-26, -38, 0), (0, 0, 270))):
            Circle(SKETCH_4_8_R, mode=Mode.SUBTRACT)
    # profile 5 of 8: a face of its own
    with BuildSketch(Plane(origin=(0, 21, 0), x_dir=(1, 0, 0), z_dir=(0, 1, 0)).offset(EXTRUDE_START_2)):
        with Locations(Location((-26, -38, 0), (0, 0, 270))):
            Circle(SKETCH_4_8_R)
    # profile 6 of 8: a face of its own
    with BuildSketch(Plane(origin=(0, 21, 0), x_dir=(1, 0, 0), z_dir=(0, 1, 0)).offset(EXTRUDE_START_2)):
        with Locations(Location((26, -38, 0), (0, 0, 270))):
            Circle(SKETCH_4_8_R)
    # profile 7 of 8: a face of its own
    with BuildSketch(Plane(origin=(0, 21, 0), x_dir=(1, 0, 0), z_dir=(0, 1, 0)).offset(EXTRUDE_START_2)):
        with Locations(Location((26, 38, 0), (0, 0, 270))):
            Circle(SKETCH_4_8_R)
    # profile 8 of 8: a face of its own
    with BuildSketch(Plane(origin=(0, 21, 0), x_dir=(1, 0, 0), z_dir=(0, 1, 0)).offset(EXTRUDE_START_2)):
        with Locations(Location((-26, 38, 0), (0, 0, 270))):
            Circle(SKETCH_4_8_R)
    extrude(amount=EXTRUDE_13_DEPTH)


solid = Compound([part_1.part, body_2_2.part])
